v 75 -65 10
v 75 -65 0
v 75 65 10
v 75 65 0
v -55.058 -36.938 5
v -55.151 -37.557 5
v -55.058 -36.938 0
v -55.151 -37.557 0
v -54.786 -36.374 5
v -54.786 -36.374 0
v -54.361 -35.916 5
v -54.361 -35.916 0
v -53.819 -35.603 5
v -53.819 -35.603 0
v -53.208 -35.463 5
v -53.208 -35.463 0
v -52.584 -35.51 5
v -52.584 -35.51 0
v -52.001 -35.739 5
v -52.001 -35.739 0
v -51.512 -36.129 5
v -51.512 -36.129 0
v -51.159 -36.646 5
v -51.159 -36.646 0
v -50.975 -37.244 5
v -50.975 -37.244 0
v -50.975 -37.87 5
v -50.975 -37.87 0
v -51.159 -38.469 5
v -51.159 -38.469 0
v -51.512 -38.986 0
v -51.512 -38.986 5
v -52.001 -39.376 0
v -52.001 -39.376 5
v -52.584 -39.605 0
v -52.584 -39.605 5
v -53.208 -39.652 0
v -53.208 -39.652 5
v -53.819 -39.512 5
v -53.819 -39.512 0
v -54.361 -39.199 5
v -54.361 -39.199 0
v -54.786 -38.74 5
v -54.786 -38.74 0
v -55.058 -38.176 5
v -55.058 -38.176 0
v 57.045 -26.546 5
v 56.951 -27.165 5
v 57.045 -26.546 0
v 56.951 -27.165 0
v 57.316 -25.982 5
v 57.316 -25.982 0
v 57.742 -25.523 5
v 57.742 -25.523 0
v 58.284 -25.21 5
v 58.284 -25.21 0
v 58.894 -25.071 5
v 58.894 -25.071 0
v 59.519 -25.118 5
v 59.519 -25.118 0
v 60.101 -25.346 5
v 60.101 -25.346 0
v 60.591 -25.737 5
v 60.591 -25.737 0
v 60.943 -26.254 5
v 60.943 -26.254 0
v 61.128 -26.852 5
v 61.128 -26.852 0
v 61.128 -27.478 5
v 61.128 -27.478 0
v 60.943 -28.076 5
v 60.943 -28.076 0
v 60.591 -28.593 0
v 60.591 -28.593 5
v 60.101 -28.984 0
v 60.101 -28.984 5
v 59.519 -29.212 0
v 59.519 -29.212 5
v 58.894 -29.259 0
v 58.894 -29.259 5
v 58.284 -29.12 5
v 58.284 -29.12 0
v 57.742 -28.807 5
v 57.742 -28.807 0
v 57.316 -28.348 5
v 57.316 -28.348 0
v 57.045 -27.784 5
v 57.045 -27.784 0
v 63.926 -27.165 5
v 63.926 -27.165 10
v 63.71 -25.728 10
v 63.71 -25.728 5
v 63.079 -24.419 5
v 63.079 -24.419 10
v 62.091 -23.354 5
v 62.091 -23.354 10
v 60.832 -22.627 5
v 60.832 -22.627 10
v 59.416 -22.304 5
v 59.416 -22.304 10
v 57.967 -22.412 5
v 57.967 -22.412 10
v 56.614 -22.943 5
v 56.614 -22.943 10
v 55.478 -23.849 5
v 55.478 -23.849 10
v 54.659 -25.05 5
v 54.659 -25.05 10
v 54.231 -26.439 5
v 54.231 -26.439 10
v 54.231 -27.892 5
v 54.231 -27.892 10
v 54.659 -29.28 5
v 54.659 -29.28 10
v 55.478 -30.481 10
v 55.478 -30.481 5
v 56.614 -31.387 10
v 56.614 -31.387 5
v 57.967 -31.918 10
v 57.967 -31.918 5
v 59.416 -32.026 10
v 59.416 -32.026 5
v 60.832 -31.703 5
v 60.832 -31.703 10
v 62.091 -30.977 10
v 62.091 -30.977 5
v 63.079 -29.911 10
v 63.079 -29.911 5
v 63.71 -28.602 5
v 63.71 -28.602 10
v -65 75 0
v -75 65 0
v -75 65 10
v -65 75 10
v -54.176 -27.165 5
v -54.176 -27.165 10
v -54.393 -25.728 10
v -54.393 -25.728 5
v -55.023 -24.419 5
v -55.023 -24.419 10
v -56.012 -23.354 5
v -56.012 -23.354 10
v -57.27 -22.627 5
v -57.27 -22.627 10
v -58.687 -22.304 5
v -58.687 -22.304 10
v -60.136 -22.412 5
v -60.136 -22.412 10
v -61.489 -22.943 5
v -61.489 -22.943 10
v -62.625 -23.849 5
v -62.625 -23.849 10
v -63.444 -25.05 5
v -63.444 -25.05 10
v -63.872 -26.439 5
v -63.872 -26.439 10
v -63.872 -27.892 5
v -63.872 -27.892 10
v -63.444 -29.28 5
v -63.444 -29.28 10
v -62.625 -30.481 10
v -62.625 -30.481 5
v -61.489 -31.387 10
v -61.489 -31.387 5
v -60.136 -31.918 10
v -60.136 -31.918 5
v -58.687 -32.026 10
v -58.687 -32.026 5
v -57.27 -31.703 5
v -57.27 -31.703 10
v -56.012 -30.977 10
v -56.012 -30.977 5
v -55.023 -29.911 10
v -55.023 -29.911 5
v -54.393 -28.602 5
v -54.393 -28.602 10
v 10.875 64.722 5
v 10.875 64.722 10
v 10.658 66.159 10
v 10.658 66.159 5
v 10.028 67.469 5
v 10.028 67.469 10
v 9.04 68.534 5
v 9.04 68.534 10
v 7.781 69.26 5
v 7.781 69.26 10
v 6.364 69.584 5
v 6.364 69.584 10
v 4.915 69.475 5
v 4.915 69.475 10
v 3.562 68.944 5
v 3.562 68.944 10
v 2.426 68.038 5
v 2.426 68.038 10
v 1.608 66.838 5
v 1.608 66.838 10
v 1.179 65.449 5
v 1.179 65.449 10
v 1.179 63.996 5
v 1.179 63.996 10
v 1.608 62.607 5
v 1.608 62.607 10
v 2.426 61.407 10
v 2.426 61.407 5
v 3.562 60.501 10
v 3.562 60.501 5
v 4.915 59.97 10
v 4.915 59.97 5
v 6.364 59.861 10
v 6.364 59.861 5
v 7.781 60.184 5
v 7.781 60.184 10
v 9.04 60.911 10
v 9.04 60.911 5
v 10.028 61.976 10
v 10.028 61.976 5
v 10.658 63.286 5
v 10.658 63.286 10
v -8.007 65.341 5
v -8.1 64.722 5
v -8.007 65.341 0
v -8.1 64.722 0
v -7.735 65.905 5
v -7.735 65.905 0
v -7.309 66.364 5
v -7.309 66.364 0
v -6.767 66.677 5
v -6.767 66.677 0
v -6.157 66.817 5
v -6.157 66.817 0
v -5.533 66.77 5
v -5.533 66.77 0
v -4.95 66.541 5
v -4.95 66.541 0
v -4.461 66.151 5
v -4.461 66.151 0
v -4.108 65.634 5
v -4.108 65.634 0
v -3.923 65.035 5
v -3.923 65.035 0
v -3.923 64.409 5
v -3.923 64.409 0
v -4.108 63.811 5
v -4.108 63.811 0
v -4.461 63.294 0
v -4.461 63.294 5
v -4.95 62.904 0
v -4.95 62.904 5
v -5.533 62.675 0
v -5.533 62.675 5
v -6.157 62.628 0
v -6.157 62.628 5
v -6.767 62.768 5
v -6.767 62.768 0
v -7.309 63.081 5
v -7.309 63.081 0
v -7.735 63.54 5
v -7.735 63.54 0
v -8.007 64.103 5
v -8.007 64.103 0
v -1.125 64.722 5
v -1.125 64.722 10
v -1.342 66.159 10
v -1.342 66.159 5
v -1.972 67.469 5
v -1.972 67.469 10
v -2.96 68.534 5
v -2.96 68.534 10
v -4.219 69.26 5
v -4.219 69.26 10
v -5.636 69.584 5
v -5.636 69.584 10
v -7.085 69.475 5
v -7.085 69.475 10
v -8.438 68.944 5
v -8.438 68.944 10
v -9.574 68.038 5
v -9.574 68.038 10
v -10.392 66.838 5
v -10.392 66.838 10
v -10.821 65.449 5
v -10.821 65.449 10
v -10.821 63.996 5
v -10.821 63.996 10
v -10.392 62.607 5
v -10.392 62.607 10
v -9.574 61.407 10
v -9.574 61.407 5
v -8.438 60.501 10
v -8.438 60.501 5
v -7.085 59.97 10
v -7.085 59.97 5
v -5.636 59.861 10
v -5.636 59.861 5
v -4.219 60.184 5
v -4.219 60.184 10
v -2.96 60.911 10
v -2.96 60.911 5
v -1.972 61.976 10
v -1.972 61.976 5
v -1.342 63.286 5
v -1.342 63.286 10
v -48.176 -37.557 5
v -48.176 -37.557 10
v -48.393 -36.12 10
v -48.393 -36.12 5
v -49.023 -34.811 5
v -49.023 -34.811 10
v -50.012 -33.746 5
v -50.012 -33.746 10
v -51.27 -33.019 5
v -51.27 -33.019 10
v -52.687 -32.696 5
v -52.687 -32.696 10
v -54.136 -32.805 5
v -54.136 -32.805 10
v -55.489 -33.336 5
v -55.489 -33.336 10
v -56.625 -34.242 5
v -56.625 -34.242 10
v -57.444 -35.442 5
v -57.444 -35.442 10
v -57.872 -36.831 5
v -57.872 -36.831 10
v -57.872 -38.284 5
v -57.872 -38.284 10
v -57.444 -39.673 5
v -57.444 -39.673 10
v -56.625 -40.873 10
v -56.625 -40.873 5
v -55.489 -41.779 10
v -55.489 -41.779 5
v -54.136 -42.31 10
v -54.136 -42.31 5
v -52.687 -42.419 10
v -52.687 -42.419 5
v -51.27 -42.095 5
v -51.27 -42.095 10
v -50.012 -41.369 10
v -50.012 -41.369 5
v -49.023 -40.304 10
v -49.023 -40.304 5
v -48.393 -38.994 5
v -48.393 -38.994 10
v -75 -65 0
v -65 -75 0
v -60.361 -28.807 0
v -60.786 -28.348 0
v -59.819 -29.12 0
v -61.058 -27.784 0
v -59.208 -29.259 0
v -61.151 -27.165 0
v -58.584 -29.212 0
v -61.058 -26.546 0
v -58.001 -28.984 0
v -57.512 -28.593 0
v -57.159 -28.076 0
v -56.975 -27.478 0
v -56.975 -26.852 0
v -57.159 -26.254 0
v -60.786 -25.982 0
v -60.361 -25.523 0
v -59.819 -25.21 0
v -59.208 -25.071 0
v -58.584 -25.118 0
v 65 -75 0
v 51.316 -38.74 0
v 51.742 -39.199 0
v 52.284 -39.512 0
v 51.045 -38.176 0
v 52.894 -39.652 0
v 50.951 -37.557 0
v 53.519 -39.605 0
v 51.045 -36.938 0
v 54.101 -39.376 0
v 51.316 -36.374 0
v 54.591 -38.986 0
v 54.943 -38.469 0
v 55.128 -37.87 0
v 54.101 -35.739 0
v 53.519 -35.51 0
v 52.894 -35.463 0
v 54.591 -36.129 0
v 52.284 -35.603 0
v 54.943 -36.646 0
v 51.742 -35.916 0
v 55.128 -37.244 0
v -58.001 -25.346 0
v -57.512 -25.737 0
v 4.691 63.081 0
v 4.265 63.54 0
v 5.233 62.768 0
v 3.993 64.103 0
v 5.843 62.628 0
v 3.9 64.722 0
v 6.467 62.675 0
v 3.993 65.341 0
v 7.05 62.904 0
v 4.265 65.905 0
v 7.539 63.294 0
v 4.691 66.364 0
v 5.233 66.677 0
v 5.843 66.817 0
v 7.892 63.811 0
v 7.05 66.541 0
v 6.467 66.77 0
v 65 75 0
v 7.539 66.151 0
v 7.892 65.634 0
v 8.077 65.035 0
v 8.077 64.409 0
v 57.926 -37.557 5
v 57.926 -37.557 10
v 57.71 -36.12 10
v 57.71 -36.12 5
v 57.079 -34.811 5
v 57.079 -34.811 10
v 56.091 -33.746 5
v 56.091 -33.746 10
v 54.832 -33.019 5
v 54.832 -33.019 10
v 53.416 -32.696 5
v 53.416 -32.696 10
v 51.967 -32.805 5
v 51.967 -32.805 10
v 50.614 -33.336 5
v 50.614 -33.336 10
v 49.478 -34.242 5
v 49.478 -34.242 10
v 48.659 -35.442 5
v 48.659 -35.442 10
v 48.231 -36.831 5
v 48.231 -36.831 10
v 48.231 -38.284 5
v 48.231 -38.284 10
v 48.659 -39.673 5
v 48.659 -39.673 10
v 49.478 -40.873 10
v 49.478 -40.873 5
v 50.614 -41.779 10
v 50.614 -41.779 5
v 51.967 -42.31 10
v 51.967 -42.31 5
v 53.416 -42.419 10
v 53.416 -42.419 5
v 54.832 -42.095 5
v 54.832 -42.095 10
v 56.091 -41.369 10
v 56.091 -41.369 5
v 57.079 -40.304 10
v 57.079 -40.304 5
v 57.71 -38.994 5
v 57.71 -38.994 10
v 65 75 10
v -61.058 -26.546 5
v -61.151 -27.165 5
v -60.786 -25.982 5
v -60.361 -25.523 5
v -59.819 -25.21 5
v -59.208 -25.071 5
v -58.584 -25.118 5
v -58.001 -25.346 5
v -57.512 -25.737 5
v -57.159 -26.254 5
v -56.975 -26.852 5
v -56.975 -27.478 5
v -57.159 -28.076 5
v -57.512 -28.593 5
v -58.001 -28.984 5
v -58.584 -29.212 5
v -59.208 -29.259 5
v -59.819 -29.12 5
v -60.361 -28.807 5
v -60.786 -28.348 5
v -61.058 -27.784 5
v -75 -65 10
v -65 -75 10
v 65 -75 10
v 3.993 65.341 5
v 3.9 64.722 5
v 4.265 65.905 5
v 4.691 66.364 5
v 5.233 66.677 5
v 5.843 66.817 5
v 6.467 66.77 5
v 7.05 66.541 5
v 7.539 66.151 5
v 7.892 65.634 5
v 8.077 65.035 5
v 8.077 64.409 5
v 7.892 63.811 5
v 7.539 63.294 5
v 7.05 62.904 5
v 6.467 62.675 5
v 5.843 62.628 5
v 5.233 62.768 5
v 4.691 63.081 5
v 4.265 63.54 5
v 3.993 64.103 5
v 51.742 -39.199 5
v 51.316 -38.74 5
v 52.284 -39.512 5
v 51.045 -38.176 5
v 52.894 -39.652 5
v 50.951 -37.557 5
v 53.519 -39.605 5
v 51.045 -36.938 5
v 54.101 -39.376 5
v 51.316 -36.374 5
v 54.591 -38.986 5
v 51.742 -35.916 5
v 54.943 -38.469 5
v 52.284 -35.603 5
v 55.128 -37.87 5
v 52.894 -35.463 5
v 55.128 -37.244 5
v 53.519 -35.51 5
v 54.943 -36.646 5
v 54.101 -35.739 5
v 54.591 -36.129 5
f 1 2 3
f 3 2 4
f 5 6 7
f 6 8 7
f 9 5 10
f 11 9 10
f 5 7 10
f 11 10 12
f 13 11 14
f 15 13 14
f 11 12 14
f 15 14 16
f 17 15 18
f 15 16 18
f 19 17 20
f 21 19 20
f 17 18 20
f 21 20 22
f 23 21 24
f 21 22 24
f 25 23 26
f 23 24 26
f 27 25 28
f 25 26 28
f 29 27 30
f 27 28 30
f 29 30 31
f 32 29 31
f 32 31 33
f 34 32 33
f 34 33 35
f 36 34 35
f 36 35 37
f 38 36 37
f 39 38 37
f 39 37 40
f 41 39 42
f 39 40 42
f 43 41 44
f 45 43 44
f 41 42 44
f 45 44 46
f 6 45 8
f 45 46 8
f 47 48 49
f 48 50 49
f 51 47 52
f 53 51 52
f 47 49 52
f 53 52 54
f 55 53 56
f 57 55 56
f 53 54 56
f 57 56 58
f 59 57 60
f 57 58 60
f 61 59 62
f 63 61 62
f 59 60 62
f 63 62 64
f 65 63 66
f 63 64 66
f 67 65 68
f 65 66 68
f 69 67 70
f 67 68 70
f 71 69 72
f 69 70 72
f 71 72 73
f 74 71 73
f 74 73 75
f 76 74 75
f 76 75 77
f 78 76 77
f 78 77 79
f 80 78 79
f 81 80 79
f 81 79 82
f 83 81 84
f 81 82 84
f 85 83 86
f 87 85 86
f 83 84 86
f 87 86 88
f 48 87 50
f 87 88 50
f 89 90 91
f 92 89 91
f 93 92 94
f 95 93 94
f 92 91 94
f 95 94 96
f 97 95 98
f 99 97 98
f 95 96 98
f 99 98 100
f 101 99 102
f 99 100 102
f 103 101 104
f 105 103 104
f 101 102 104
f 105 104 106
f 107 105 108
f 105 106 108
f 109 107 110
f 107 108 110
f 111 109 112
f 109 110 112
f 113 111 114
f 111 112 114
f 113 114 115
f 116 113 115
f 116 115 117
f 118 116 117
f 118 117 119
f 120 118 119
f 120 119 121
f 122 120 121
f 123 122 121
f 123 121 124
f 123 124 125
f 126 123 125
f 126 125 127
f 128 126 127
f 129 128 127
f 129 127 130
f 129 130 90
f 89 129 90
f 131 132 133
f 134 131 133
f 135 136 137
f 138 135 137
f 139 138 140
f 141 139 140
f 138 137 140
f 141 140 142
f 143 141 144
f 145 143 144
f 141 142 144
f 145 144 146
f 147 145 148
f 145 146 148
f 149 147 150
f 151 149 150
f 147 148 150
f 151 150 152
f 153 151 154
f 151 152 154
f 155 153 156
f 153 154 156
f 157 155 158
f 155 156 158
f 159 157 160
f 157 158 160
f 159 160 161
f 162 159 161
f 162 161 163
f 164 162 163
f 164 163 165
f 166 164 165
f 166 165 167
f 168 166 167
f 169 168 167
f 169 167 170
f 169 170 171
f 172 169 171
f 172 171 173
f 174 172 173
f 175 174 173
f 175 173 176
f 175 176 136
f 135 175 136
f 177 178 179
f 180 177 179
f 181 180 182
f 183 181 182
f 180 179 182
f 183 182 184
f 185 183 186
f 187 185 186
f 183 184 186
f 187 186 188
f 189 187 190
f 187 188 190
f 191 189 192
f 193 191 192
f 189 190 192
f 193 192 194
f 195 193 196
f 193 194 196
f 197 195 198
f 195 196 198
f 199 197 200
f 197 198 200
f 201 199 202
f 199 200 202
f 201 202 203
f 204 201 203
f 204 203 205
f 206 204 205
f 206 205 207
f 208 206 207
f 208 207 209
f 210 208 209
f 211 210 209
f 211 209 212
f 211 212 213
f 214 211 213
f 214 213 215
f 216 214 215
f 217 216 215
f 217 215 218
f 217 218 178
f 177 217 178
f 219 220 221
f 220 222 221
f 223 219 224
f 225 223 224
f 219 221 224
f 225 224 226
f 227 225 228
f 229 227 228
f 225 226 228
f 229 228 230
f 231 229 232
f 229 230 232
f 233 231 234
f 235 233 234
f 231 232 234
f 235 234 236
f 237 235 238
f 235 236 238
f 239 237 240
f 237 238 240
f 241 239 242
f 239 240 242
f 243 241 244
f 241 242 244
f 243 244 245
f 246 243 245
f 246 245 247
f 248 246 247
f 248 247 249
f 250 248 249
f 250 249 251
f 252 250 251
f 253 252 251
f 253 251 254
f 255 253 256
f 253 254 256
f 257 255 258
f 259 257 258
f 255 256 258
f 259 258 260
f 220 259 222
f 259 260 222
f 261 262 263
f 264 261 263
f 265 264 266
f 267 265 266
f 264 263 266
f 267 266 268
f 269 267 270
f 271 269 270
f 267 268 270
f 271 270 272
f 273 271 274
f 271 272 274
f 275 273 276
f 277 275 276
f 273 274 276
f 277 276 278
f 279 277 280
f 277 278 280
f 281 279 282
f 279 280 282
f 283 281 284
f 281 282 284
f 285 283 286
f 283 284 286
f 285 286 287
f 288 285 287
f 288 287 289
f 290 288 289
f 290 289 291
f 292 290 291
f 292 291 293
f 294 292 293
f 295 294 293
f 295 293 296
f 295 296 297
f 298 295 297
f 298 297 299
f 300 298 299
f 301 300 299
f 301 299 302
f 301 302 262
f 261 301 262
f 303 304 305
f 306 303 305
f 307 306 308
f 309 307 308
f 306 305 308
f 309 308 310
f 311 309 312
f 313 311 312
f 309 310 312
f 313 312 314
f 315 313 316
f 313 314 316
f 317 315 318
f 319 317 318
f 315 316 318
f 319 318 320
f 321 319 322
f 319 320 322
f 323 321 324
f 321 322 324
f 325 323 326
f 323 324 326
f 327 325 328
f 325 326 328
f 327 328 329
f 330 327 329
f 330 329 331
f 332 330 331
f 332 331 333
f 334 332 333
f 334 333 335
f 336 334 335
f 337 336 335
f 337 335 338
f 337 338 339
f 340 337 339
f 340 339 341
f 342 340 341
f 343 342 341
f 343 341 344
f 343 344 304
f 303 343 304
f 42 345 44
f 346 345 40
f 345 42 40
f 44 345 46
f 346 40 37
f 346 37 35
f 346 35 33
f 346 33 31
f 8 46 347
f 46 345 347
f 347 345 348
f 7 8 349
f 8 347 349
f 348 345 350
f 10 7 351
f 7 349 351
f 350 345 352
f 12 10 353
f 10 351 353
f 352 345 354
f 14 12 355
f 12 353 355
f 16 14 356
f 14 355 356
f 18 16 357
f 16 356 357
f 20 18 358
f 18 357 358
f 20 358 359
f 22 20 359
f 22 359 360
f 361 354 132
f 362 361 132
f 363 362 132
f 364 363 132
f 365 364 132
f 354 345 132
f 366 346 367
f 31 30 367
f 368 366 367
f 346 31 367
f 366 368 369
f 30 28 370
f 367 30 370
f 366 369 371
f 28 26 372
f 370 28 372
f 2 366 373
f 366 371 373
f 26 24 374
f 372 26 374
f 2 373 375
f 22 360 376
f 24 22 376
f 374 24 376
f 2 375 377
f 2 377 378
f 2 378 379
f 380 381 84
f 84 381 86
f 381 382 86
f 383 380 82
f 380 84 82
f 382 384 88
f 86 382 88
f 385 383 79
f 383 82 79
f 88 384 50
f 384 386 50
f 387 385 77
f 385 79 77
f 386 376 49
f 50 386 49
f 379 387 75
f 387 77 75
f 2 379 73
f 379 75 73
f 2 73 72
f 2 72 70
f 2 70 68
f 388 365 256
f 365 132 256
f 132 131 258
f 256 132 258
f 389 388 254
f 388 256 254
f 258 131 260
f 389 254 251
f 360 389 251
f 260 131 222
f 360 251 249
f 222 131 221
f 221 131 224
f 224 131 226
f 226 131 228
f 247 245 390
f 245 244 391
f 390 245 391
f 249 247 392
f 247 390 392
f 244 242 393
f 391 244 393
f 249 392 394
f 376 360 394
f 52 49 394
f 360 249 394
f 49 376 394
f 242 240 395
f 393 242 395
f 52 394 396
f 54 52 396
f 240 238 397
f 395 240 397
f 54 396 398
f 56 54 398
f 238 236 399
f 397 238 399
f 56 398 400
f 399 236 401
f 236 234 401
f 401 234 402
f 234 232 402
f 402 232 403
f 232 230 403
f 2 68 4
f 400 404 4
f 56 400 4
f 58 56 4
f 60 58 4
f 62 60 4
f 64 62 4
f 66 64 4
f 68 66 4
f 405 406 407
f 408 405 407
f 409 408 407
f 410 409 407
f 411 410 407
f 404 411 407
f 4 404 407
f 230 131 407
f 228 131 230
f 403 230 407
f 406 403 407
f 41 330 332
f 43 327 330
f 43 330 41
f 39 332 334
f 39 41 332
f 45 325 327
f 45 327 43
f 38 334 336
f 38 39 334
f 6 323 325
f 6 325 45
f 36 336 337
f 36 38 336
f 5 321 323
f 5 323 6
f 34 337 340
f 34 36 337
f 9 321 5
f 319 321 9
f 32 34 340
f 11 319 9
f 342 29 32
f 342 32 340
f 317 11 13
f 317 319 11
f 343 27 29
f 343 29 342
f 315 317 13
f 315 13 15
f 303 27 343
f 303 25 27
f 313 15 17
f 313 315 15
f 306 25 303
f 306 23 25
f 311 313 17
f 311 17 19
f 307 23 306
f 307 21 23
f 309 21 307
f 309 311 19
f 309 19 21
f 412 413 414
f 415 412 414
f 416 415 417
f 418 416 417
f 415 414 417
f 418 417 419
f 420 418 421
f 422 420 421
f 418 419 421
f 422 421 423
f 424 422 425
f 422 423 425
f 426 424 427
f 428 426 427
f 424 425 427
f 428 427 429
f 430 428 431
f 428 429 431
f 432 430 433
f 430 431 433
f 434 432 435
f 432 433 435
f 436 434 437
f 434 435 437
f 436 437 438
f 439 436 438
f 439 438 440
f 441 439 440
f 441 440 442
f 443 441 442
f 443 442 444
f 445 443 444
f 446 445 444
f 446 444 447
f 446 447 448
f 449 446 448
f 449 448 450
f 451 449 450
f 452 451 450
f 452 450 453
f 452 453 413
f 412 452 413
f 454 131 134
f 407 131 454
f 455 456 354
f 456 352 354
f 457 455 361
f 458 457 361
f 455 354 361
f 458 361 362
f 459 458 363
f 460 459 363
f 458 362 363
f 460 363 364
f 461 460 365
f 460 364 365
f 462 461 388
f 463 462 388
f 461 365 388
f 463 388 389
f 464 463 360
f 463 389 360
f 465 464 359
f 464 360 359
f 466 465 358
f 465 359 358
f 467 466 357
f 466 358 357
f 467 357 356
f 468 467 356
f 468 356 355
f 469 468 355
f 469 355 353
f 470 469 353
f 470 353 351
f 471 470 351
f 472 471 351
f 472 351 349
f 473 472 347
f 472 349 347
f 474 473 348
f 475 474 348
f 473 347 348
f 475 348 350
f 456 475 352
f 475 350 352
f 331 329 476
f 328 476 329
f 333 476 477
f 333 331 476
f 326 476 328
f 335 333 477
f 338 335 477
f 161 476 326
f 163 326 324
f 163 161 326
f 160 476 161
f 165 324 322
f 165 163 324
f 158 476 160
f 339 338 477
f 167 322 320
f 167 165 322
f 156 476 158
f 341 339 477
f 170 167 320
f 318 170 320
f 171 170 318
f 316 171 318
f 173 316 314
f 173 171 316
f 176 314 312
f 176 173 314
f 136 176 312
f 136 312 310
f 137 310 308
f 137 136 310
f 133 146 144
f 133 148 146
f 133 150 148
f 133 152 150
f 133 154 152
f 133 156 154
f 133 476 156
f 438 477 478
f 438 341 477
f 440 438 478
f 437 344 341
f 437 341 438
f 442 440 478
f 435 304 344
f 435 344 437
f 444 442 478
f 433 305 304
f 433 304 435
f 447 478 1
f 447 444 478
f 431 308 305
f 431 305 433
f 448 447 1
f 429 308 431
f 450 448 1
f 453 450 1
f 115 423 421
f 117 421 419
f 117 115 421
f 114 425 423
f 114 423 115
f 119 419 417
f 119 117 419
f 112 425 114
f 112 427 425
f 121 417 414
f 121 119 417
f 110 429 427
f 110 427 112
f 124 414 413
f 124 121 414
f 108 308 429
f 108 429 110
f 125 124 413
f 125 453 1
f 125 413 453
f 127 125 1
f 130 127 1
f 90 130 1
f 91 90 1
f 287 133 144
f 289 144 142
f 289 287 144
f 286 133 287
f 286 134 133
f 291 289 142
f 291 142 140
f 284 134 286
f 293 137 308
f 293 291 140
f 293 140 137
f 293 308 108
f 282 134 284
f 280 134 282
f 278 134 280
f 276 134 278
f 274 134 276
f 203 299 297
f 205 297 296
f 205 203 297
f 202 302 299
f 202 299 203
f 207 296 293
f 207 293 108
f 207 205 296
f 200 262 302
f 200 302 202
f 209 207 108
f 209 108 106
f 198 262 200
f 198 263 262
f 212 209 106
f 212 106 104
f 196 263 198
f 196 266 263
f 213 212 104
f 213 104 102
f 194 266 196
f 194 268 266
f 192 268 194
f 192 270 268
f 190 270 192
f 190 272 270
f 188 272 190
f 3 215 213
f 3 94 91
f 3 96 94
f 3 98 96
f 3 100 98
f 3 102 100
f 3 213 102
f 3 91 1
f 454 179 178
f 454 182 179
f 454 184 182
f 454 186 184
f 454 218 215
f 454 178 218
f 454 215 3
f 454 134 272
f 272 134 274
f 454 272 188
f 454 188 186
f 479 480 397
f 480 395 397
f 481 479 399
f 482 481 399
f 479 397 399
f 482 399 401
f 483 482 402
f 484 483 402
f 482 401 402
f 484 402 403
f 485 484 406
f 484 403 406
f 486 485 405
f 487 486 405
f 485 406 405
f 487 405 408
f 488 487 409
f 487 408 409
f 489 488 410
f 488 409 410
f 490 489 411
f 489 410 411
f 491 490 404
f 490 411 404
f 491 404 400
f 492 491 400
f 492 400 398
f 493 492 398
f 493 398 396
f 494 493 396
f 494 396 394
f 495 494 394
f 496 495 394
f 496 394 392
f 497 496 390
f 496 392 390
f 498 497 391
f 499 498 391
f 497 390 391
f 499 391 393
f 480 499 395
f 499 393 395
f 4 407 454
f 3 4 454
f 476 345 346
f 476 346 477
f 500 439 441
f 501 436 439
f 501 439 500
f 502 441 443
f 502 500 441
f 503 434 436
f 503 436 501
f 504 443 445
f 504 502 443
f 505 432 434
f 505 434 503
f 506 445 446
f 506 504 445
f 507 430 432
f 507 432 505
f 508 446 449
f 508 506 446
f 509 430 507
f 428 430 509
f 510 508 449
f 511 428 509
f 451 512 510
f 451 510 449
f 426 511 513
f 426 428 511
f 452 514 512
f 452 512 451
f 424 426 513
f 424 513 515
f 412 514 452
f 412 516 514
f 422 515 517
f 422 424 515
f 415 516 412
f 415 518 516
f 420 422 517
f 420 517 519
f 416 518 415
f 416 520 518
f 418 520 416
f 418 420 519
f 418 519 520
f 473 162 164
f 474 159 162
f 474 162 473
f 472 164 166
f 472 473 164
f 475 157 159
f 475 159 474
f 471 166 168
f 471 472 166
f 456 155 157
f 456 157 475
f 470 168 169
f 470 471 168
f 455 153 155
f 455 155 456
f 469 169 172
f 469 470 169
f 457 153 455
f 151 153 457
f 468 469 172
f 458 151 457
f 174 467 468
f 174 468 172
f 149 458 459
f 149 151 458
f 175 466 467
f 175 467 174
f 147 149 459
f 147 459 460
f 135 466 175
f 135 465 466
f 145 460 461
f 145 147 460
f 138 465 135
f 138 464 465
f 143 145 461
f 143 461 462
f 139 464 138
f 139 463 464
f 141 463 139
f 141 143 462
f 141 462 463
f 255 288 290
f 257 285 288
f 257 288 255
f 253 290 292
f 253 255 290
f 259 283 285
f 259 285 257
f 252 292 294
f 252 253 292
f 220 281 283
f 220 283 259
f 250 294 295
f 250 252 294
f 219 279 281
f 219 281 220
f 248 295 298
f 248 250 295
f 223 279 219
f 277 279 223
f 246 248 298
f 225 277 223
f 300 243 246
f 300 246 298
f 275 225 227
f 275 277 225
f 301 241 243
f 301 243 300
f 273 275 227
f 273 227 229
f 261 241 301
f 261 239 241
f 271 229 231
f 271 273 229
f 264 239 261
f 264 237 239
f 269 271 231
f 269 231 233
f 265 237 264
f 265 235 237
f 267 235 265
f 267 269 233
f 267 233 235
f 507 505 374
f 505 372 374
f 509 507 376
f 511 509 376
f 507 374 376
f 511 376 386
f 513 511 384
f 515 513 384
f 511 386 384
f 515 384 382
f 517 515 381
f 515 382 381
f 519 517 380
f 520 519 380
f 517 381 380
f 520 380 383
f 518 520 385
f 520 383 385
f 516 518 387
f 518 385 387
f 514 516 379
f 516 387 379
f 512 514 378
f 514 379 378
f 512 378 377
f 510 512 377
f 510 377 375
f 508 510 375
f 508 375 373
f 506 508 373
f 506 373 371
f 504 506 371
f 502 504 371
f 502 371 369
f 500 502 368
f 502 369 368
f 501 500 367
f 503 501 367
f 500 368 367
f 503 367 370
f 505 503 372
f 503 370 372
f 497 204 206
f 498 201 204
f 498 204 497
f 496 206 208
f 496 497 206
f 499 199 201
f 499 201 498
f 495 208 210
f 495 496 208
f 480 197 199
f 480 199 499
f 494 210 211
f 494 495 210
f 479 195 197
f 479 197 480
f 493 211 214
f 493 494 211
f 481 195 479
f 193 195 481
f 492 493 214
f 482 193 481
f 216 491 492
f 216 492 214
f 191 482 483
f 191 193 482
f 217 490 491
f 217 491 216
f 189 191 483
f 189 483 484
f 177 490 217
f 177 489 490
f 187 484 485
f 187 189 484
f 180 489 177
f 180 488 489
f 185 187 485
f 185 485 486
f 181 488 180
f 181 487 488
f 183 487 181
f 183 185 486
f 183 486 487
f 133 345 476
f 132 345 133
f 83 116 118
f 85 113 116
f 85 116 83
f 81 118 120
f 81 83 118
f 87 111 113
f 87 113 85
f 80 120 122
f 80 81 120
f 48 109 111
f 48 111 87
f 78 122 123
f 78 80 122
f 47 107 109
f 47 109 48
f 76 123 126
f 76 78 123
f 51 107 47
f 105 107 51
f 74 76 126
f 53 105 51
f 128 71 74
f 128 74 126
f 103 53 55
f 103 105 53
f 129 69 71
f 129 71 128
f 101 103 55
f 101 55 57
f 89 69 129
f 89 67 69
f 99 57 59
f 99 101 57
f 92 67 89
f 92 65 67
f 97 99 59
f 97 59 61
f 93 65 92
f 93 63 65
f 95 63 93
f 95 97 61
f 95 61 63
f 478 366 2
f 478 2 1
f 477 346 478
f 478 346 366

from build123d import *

# Parameters (mm, degrees)
F0_W           = 150
F0_H           = 150
F1_DEPTH       = 10
F3_D           = 4.2
F3_DEPTH       = 15.8
F3_CBORE_D     = 9.75
F3_CBORE_DEPTH = 5
F3_TIP         = 1.2618073
F4_SIZE        = 10


with BuildPart() as f1:
    # F0 (on Top) → F1 (new body)
    with BuildSketch(Plane.XY):
        Rectangle(F0_W, F0_H)
    extrude(amount=F1_DEPTH)

    # F3
    with Locations(Plane.XY.offset(10)):
        with Locations((-6, 64.7224845011), (6, 64.7224845011), (-59.051315774, -27.1650898279), (-53.051315774, -37.5573946733), (53.051315774, -37.5573946733), (59.051315774, -27.1650898279)):
            CounterBoreHole(F3_D / 2, F3_CBORE_D / 2, F3_CBORE_DEPTH, depth=F3_DEPTH)
            with Locations((0, 0, -(F3_DEPTH + F3_TIP / 2))):  # 118° drill point
                Cone(0, F3_D / 2, F3_TIP, mode=Mode.SUBTRACT)

    # F4
    f4_edges = [f1.edges().sort_by_distance(p)[0] for p in [
        (-75, 75, 5),
        (75, 75, 5),
        (75, -75, 5),
        (-75, -75, 5),
    ]]
    chamfer(f4_edges, length=F4_SIZE)


solid = f1.part
